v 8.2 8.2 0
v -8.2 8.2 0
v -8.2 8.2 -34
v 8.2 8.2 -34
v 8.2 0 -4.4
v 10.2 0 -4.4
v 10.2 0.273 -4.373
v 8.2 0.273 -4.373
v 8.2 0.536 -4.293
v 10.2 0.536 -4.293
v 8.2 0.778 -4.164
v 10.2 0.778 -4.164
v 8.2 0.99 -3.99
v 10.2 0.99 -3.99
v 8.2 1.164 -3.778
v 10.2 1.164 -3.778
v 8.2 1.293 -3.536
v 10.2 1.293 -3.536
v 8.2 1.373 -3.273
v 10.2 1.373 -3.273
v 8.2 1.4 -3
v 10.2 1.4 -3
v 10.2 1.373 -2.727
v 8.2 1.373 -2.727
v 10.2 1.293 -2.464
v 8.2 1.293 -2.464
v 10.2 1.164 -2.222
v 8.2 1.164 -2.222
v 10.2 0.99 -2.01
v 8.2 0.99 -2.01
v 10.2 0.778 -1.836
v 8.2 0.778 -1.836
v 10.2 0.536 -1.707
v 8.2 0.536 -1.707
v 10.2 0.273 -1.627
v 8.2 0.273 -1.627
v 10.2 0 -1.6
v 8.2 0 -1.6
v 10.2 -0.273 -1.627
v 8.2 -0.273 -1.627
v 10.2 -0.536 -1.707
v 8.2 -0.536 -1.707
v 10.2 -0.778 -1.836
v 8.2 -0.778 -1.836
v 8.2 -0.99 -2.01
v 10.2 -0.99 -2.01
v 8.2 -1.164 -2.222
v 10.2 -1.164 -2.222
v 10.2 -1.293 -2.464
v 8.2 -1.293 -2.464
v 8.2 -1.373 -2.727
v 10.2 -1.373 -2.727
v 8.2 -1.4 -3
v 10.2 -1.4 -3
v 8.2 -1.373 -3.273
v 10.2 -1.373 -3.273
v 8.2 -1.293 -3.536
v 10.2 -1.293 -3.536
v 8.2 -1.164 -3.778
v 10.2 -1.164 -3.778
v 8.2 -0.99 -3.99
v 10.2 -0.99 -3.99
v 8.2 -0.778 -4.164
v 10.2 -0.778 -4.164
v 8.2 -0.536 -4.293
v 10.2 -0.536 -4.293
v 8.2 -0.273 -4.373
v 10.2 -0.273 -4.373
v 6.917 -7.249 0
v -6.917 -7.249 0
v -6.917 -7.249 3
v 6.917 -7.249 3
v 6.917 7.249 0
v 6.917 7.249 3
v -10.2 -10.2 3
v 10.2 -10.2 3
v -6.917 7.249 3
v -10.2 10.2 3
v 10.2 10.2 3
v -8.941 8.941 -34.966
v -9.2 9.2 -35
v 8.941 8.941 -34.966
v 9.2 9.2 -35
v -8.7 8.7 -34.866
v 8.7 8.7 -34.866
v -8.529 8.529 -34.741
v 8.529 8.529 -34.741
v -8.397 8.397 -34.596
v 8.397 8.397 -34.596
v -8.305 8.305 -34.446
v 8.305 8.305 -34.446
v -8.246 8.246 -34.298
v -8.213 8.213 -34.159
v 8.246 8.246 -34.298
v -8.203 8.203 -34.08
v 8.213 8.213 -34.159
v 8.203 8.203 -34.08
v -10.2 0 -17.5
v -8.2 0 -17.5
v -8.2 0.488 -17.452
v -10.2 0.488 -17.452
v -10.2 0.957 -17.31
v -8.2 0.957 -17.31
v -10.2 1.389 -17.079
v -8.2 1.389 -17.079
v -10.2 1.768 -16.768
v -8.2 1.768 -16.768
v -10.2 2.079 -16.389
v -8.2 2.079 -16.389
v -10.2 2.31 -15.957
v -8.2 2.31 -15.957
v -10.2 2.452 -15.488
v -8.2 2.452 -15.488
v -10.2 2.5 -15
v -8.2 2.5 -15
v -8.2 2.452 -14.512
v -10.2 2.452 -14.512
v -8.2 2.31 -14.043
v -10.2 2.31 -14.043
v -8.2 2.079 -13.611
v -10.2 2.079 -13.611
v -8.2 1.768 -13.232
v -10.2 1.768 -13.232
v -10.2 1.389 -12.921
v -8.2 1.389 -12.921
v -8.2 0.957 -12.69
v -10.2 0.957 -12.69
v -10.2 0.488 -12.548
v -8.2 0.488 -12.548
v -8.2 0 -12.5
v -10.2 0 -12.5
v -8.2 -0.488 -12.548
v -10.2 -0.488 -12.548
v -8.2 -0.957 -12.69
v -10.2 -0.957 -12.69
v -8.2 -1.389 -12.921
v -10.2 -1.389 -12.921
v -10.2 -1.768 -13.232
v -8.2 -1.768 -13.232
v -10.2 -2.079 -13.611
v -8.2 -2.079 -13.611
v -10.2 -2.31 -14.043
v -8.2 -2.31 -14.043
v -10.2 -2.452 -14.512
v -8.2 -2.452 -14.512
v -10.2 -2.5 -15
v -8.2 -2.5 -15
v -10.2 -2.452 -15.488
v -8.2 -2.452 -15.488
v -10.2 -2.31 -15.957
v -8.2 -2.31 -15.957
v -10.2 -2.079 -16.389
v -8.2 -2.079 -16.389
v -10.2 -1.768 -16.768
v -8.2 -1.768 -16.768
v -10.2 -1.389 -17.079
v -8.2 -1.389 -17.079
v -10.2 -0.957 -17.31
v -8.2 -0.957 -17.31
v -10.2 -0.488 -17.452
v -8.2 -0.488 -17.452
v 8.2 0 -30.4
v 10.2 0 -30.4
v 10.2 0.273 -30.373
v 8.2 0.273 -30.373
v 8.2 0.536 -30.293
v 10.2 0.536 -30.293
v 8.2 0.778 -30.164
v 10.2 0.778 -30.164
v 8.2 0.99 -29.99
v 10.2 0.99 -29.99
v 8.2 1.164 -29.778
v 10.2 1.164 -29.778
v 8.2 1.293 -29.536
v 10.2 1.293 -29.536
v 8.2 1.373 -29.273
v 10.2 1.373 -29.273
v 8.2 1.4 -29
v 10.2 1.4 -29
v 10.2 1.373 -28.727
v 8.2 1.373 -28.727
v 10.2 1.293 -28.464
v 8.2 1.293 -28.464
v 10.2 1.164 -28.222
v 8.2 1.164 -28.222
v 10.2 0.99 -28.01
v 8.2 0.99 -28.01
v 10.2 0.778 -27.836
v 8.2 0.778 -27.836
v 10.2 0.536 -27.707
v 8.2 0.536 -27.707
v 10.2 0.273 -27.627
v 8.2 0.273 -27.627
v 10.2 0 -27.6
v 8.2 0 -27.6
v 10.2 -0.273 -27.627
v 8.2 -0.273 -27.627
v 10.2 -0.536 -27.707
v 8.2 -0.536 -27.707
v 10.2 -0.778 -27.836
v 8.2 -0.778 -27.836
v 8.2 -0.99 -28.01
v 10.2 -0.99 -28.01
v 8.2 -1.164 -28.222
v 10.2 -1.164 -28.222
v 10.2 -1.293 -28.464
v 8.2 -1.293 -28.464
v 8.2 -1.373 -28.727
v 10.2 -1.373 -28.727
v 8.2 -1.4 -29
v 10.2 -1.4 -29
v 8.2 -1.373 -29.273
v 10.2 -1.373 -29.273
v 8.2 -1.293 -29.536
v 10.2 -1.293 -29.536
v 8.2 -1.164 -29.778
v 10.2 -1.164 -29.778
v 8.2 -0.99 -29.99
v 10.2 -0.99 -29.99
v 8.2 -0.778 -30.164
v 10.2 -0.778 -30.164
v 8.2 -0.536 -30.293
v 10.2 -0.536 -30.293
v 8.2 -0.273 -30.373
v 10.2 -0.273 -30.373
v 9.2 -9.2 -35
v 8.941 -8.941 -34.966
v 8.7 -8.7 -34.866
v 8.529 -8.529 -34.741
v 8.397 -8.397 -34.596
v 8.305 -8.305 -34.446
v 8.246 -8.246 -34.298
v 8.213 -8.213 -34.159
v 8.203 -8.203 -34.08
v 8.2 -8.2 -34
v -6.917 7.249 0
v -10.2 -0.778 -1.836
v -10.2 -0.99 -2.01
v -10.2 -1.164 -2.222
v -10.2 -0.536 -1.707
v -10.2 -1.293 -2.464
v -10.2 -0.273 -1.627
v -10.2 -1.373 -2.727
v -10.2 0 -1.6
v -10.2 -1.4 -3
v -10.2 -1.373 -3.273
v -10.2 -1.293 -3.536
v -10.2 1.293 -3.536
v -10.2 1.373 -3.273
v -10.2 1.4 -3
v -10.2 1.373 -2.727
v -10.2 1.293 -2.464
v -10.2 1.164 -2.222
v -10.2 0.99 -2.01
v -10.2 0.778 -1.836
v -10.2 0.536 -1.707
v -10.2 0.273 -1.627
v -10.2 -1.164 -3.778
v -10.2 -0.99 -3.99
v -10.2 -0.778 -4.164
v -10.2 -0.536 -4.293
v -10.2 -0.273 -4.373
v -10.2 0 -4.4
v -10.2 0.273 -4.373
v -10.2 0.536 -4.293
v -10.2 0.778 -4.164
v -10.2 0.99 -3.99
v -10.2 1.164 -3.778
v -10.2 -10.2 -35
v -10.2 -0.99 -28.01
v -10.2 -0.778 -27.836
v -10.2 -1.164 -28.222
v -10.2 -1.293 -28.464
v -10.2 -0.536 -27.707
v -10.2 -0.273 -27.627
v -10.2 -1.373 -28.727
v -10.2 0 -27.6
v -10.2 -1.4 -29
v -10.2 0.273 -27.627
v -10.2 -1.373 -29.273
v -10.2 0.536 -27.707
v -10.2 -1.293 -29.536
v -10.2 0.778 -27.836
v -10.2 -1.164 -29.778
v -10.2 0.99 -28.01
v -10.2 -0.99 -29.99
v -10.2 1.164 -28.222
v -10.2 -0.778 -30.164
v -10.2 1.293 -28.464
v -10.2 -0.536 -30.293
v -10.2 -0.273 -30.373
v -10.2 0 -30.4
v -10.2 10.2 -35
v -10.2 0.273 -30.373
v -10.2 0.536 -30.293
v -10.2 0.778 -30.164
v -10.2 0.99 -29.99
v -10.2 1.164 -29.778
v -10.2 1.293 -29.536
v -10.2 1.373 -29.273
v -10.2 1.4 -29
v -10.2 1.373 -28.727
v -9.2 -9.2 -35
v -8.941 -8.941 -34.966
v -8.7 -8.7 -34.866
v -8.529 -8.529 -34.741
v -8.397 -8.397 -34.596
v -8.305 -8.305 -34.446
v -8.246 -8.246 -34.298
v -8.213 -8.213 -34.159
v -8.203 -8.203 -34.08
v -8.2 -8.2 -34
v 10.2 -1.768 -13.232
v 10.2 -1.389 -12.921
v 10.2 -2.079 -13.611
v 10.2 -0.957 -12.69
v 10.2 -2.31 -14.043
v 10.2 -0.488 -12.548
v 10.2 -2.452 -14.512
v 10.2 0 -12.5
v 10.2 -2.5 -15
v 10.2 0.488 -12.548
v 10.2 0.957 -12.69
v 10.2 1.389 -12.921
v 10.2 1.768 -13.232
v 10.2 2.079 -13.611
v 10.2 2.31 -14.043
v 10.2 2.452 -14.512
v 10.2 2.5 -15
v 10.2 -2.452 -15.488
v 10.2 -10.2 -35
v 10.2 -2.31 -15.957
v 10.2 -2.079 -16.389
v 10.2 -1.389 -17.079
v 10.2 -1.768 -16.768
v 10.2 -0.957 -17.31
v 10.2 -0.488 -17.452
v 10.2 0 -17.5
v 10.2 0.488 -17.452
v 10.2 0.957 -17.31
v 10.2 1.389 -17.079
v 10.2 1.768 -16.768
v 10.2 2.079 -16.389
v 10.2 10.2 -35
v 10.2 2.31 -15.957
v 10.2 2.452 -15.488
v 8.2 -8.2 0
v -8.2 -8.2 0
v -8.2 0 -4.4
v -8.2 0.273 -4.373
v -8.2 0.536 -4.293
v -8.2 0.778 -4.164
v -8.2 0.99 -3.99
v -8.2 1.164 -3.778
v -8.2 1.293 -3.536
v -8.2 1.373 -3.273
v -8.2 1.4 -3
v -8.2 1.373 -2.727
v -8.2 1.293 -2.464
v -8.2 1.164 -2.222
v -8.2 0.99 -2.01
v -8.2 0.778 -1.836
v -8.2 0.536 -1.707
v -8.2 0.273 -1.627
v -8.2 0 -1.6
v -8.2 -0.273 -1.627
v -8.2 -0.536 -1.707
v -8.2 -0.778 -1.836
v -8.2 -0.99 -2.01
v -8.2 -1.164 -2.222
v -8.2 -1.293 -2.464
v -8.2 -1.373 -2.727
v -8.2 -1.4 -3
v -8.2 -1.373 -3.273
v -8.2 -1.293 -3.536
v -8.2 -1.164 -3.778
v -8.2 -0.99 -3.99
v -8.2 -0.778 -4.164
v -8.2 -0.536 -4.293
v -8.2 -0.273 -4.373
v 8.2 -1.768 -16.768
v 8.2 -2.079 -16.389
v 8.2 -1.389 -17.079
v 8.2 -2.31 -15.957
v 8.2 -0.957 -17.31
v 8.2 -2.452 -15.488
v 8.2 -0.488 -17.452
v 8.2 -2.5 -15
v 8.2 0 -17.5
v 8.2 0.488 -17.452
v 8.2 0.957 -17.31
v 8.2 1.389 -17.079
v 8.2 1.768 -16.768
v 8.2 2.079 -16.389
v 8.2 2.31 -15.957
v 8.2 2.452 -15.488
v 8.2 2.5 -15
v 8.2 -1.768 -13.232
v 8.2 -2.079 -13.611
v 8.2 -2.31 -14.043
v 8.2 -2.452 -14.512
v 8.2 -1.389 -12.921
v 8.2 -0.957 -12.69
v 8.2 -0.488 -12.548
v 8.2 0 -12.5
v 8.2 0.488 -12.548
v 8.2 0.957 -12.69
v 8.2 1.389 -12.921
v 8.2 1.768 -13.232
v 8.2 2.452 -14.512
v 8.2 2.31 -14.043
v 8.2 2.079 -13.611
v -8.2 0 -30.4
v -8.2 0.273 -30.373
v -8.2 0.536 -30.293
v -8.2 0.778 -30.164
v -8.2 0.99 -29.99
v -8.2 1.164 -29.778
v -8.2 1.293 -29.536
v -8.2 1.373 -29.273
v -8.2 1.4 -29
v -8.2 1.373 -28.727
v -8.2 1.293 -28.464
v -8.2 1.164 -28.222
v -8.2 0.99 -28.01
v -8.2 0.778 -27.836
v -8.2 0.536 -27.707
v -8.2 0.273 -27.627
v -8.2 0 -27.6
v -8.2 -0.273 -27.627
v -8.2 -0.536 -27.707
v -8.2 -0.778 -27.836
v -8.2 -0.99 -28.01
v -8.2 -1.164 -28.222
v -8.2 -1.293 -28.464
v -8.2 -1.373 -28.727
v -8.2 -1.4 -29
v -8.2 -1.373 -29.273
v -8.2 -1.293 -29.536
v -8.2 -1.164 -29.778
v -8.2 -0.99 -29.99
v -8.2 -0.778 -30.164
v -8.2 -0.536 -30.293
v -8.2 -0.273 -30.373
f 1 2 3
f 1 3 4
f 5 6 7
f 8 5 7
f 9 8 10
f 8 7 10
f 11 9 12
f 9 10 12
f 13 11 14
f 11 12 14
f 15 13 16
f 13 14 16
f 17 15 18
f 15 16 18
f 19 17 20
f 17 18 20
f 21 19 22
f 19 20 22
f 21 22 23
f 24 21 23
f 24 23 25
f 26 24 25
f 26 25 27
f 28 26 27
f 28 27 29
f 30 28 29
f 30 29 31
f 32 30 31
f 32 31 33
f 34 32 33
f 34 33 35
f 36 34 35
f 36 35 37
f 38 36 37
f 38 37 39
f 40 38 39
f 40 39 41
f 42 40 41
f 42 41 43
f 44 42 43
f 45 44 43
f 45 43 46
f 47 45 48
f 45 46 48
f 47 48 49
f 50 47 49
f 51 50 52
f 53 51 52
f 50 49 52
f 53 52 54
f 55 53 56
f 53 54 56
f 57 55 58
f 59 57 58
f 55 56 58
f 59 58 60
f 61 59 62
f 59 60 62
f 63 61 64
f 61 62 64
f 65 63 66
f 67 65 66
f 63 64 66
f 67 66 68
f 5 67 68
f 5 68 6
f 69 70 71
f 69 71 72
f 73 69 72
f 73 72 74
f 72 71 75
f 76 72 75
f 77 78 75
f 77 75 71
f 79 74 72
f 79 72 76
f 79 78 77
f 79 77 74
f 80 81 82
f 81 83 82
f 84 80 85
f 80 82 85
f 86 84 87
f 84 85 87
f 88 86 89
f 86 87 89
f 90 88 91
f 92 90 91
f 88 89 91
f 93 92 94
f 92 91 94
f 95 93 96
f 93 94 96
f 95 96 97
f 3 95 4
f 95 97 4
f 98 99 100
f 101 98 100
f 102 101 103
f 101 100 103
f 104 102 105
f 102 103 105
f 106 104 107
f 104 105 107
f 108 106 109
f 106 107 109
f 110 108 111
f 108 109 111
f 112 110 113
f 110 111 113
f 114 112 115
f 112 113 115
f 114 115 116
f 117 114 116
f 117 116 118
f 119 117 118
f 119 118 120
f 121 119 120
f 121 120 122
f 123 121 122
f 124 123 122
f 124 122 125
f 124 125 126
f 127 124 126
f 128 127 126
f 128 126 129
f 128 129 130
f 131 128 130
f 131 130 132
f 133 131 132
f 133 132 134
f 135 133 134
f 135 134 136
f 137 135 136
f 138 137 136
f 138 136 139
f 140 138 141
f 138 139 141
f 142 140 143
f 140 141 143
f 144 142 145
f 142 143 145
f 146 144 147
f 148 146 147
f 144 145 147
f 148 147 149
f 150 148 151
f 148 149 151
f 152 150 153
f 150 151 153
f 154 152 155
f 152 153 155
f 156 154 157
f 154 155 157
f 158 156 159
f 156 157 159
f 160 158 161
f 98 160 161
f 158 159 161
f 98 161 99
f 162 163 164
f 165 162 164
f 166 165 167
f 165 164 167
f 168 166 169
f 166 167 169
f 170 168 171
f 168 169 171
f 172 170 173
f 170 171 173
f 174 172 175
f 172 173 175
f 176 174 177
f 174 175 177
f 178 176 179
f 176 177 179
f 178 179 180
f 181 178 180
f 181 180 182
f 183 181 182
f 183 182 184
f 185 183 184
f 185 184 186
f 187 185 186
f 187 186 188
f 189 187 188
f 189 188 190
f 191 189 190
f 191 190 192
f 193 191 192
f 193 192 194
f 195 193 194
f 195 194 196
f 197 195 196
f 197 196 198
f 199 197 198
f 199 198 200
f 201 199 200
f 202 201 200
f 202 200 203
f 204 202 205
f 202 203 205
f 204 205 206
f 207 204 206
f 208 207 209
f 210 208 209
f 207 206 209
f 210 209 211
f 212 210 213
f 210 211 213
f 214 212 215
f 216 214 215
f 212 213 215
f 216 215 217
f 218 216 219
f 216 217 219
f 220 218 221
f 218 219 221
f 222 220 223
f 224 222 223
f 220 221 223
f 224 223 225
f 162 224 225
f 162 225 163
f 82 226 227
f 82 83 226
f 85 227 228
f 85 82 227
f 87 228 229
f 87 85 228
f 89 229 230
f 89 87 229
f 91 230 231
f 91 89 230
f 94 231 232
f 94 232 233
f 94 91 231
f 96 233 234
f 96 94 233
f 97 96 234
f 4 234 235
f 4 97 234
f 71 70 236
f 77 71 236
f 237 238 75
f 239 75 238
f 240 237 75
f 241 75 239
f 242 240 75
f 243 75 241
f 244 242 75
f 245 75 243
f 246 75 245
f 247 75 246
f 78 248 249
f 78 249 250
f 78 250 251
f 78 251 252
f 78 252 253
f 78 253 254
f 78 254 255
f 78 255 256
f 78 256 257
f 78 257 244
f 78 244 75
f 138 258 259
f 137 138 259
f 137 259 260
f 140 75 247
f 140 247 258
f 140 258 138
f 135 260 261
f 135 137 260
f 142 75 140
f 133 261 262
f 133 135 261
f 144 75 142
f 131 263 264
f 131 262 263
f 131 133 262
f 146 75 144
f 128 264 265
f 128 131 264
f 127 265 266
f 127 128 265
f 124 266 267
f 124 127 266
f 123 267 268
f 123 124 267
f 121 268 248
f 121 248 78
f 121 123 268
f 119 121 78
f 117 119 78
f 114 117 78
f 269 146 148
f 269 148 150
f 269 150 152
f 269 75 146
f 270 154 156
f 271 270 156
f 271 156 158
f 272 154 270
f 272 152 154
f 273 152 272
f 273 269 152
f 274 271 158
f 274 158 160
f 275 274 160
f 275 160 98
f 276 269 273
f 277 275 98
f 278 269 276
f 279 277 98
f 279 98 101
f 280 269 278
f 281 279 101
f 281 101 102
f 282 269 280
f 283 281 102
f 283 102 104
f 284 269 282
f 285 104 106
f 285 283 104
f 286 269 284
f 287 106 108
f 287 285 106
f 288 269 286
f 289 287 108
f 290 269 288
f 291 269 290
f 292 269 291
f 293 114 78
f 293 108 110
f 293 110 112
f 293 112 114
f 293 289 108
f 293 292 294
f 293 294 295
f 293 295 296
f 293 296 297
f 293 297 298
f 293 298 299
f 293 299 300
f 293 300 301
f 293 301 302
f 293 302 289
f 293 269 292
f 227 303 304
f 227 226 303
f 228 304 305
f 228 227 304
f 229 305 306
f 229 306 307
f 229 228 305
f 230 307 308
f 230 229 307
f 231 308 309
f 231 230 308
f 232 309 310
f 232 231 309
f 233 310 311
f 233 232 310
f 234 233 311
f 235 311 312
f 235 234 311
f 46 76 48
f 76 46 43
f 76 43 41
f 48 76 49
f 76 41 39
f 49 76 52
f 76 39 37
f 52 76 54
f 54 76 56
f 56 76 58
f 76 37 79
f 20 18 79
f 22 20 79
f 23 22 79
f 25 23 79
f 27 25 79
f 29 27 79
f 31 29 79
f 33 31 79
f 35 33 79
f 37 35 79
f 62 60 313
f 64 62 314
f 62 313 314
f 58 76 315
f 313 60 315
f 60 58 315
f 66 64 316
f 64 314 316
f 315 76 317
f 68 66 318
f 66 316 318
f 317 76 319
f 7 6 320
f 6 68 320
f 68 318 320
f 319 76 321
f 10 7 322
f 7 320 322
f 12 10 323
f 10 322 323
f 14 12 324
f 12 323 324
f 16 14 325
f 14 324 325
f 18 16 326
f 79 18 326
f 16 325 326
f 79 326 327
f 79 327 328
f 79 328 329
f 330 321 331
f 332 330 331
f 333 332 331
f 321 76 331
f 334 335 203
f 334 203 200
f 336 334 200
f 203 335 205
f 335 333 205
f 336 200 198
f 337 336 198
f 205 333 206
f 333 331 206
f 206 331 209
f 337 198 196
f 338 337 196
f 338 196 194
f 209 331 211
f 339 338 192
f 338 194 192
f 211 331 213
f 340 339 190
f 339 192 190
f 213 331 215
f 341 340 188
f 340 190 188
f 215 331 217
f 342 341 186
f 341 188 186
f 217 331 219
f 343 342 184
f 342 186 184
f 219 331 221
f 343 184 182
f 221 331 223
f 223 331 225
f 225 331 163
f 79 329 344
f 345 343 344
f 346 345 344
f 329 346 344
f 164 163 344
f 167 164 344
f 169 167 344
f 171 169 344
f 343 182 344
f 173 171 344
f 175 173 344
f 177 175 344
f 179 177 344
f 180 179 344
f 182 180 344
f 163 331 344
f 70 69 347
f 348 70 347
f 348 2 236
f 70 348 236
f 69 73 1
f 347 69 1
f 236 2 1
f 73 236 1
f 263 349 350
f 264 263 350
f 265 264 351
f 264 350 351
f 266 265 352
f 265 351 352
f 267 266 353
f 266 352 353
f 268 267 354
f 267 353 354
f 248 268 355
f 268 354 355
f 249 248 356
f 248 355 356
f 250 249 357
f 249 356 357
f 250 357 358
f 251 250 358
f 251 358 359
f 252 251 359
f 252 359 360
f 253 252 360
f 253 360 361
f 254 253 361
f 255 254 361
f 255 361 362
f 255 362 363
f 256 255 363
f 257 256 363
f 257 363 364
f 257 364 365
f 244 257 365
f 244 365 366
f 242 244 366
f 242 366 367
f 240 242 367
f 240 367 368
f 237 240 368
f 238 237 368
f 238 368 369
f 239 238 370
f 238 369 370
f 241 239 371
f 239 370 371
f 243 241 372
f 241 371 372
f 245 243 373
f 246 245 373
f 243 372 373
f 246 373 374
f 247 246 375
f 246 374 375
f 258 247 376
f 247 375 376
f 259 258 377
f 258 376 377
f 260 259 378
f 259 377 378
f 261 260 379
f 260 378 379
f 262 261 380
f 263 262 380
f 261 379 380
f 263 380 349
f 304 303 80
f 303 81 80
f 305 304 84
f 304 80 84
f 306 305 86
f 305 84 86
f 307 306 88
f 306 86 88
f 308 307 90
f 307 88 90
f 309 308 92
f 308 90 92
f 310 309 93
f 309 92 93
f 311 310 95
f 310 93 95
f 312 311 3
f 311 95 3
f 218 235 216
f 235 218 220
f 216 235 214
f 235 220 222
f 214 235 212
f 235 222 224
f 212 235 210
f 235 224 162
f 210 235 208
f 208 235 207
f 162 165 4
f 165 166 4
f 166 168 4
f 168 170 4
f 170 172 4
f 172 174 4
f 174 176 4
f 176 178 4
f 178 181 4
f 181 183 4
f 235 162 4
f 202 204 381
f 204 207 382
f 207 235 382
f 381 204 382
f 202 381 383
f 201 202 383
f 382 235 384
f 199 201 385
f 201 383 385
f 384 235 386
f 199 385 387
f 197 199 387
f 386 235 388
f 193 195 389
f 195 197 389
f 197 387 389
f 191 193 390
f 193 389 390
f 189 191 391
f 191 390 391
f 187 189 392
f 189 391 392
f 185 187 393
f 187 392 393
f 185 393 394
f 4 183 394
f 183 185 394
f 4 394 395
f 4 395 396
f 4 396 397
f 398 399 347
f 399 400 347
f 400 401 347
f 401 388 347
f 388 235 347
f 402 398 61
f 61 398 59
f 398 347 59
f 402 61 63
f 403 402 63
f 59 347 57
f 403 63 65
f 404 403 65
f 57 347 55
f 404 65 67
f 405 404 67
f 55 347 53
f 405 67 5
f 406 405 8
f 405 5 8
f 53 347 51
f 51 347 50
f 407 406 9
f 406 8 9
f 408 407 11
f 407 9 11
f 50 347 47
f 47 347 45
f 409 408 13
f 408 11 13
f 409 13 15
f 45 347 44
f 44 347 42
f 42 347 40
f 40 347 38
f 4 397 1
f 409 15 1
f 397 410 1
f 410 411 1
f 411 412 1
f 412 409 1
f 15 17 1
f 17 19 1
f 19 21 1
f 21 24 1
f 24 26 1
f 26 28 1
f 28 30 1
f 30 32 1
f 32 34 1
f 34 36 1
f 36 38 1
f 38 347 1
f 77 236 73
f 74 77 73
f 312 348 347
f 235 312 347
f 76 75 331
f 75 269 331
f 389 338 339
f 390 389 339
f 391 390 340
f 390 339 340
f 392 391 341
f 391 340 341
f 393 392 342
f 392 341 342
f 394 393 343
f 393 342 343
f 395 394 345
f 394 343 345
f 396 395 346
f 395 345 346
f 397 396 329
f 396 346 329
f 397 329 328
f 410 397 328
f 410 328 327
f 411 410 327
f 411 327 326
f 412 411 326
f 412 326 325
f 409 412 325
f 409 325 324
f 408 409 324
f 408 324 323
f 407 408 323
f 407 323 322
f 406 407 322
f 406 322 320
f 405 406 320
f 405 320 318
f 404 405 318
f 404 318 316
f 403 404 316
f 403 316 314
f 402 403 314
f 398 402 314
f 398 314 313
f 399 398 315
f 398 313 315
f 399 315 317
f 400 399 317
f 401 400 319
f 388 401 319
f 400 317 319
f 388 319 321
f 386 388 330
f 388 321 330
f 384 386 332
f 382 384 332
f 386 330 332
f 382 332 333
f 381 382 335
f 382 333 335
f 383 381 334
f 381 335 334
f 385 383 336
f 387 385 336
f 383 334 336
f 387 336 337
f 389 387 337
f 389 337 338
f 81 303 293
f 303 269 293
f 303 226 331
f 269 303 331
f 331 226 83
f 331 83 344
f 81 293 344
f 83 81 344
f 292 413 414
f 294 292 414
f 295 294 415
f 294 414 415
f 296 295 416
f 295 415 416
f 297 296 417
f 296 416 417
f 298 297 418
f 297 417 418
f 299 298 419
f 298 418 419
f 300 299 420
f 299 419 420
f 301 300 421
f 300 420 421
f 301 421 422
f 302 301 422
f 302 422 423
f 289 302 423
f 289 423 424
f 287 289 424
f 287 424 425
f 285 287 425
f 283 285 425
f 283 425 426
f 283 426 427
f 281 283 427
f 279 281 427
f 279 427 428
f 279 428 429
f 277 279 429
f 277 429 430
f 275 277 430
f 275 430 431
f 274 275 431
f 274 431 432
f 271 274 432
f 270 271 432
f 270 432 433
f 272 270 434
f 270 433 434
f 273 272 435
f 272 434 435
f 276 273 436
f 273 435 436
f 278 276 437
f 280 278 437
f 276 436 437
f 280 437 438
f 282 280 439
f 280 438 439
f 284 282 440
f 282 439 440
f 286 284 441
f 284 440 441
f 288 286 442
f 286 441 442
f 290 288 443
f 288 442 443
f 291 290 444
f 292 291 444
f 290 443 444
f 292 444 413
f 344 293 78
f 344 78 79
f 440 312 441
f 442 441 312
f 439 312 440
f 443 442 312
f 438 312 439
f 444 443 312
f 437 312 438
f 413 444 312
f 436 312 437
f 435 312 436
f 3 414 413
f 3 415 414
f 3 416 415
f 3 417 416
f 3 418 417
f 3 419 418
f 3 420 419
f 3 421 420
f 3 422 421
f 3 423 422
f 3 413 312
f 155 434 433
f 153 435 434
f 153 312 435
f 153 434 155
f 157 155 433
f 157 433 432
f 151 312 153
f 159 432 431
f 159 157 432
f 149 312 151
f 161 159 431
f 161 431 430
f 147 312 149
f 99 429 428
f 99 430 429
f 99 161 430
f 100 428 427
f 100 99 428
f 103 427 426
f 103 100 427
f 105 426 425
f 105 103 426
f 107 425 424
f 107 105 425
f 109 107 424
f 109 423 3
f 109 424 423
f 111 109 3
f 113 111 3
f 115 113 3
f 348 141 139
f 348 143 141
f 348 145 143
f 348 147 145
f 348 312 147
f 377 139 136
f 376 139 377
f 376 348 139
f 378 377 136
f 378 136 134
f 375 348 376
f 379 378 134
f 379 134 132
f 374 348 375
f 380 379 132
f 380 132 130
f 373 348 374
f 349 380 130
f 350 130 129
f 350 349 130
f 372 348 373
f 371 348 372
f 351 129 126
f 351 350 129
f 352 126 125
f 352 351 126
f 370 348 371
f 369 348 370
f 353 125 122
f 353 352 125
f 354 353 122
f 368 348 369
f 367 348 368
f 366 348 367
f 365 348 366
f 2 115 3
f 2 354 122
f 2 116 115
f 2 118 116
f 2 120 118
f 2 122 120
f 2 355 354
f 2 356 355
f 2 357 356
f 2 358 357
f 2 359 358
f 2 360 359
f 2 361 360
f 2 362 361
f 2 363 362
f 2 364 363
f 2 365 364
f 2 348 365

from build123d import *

# Parameters (mm, degrees)
SKETCH1_W           = 20.4
SKETCH1_H           = 20.4
SKETCH1_W_2         = 16.4
SKETCH1_H_2         = 16.4
BOSS_EXTRUDE1_DEPTH = 35
SKETCH2_W           = 20.4
SKETCH2_H           = 20.4
SKETCH2_W_2         = 13.834702386
SKETCH2_H_2         = 14.497254018
BOSS_EXTRUDE2_DEPTH = 3
SKETCH3_R           = 1.4
SKETCH3_R_2         = 2.5
CUT_EXTRUDE1_DEPTH  = 42.775590959
FILLET1_R           = 1


with BuildPart() as part:
    # Sketch1 → Boss-Extrude1 (new body)
    with BuildSketch(Plane.XY):
        Rectangle(SKETCH1_W, SKETCH1_H)
        Rectangle(SKETCH1_W_2, SKETCH1_H_2, mode=Mode.SUBTRACT)
    extrude(amount=-BOSS_EXTRUDE1_DEPTH)

    # Sketch2 → Boss-Extrude2 (add)
    with BuildSketch(Plane.XY):
        Rectangle(SKETCH2_W, SKETCH2_H)
        Rectangle(SKETCH2_W_2, SKETCH2_H_2, mode=Mode.SUBTRACT)
    extrude(amount=BOSS_EXTRUDE2_DEPTH)

    # Sketch3 → Cut-Extrude1 (cut, through all)
    with BuildSketch(Plane(origin=(10.2, 0, 0), x_dir=(0, 0, -1), z_dir=(1, 0, 0))):
        with Locations((3, 0)):
            Circle(SKETCH3_R)
        with Locations((29, 0)):
            Circle(SKETCH3_R)
        with Locations((15, 0)):
            Circle(SKETCH3_R_2)
    extrude(amount=-CUT_EXTRUDE1_DEPTH, mode=Mode.SUBTRACT)

    # Fillet1
    fillet1_edges = [part.edges().sort_by_distance(p)[0] for p in [
        (8.2, 0, -35),
        (0, -8.2, -35),
        (-8.2, 0, -35),
        (0, 8.2, -35),
    ]]
    fillet(fillet1_edges, radius=FILLET1_R)


solid = part.part
